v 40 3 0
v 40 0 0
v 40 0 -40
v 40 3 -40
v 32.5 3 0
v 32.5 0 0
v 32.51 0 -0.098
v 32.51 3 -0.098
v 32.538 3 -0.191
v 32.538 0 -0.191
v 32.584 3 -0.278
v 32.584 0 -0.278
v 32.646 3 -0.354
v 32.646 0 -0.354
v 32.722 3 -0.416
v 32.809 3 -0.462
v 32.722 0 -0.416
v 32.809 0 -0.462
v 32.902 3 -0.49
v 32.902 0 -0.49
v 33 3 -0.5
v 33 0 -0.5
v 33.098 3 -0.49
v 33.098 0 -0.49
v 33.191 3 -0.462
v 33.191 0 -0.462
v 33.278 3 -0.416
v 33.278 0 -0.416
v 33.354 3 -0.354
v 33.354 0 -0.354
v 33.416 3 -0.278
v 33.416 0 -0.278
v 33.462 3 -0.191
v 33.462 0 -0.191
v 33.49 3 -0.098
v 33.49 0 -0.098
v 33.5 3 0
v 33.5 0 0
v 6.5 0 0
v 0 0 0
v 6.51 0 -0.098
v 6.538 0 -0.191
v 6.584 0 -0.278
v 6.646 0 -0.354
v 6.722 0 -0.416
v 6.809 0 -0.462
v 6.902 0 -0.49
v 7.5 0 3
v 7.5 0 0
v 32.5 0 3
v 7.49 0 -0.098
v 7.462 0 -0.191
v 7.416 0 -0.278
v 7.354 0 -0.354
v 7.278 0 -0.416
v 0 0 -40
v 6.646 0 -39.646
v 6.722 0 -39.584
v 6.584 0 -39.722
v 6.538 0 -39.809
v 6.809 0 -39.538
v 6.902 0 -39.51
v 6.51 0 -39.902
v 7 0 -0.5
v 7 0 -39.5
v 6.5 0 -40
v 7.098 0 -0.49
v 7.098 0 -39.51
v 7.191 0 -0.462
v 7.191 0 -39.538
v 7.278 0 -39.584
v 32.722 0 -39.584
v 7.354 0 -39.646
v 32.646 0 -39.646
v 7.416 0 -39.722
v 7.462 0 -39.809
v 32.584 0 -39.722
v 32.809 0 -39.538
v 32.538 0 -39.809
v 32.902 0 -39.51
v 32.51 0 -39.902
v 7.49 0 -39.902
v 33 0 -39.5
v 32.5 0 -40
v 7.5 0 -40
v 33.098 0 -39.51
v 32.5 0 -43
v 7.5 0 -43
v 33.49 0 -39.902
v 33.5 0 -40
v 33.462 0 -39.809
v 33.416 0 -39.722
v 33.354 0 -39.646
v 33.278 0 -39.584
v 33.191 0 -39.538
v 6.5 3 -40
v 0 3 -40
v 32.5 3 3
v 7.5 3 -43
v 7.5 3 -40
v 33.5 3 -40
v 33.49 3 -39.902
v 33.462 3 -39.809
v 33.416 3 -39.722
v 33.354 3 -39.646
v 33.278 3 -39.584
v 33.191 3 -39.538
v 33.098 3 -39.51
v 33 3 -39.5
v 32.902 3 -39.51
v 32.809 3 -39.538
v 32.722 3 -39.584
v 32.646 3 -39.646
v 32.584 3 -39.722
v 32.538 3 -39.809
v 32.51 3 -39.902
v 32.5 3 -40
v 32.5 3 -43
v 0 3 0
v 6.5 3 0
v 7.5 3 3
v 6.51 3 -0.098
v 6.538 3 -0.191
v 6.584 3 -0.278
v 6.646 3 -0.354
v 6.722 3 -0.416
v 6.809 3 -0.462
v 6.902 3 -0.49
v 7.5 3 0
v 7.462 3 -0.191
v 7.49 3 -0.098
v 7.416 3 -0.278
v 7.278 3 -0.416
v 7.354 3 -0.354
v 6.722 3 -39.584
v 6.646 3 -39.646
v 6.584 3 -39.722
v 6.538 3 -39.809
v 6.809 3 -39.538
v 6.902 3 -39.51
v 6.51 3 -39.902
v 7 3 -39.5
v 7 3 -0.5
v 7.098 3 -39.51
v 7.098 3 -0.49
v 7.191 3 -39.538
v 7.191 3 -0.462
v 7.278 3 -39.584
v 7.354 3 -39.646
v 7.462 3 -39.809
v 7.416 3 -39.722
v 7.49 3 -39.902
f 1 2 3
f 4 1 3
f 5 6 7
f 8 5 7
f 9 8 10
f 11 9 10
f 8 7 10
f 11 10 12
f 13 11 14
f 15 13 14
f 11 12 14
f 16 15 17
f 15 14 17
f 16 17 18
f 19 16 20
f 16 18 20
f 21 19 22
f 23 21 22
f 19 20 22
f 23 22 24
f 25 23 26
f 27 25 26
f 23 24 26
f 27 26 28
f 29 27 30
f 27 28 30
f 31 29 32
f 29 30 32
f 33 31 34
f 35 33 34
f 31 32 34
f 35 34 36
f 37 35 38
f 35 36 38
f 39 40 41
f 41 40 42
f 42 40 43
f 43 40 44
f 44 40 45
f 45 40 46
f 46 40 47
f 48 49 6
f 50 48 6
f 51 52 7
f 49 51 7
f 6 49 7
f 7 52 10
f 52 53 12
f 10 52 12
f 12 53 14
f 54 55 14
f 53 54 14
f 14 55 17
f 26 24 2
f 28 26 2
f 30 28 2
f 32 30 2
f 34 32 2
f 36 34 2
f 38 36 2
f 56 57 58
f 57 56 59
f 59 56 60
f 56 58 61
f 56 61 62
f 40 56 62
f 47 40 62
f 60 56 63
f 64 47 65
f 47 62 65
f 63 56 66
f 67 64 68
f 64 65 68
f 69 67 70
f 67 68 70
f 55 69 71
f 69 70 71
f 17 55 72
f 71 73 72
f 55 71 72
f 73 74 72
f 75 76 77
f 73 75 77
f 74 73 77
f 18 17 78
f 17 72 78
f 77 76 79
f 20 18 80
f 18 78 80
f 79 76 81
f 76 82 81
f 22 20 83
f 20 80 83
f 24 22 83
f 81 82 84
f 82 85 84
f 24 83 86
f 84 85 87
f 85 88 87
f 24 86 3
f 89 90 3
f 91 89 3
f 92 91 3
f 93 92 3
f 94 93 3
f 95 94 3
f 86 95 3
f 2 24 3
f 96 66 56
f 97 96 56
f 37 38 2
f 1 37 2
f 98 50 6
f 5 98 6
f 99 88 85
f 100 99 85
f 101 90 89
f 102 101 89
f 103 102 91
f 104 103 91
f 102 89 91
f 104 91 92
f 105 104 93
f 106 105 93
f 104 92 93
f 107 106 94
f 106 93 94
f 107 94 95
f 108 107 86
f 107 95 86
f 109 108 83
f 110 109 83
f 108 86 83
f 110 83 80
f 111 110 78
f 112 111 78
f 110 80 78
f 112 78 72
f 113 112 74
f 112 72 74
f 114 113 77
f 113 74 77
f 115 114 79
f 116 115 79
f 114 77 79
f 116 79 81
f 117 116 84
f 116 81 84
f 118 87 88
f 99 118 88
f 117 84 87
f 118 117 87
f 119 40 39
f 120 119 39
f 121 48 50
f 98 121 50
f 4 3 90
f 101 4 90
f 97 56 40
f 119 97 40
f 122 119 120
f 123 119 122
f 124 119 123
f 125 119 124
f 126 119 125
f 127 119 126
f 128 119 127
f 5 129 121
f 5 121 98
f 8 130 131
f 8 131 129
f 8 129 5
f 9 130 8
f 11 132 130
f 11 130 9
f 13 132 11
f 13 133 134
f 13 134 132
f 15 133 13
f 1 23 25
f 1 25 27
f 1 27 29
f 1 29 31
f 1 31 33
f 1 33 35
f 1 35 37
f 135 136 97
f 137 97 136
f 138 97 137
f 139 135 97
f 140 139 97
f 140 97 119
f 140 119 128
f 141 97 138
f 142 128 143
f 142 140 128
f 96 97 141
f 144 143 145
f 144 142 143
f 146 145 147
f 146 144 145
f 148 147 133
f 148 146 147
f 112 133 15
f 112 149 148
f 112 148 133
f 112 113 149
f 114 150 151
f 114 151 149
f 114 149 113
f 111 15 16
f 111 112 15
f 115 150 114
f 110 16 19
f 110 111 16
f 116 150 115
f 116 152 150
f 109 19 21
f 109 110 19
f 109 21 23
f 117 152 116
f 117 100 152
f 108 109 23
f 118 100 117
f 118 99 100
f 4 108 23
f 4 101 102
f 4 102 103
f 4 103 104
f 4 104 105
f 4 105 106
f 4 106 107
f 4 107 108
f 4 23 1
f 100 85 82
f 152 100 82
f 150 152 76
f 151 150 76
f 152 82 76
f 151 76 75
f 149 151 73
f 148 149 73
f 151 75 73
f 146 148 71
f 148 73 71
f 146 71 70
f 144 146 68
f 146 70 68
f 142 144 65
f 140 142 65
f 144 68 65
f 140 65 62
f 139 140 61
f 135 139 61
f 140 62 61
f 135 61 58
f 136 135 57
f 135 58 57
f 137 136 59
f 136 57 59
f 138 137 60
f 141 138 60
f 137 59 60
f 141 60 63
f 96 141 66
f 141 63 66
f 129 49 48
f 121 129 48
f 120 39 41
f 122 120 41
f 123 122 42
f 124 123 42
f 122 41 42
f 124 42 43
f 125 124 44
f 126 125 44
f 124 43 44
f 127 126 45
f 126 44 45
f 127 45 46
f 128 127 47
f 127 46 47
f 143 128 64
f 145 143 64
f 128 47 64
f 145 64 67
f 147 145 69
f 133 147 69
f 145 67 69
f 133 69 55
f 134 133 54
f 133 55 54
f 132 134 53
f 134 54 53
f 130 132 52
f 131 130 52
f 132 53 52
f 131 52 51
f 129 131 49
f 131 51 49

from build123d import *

# Parameters (mm, degrees)
BOSS_EXTRUDE1_DEPTH = 3


with BuildPart() as part:
    # Sketch1 → Boss-Extrude1 (new body)
    with BuildSketch(Plane(origin=(0, 0, 0), x_dir=(1, 0, 0), z_dir=(0, 1, 0))):
        with BuildLine():
            Line((0, 0), (6.5, 0))
            ThreePointArc((6.5, 0), (7, 0.5), (7.5, 0))
            Line((7.5, 0), (7.5, -3))
            Line((7.5, -3), (32.5, -3))
            Line((32.5, -3), (32.5, 0))
            ThreePointArc((32.5, 0), (33, 0.5), (33.5, 0))
            Line((33.5, 0), (40, 0))
            Line((40, 0), (40, 40))
            Line((40, 40), (33.5, 40))
            ThreePointArc((33.5, 40), (33, 39.5), (32.5, 40))
            Line((32.5, 40), (32.5, 43))
            Line((32.5, 43), (7.5, 43))
            Line((7.5, 43), (7.5, 40))
            ThreePointArc((7.5, 40), (7, 39.5), (6.5, 40))
            Line((6.5, 40), (0, 40))
            Line((0, 40), (0, 0))
        make_face()
    extrude(amount=BOSS_EXTRUDE1_DEPTH)


solid = part.part
